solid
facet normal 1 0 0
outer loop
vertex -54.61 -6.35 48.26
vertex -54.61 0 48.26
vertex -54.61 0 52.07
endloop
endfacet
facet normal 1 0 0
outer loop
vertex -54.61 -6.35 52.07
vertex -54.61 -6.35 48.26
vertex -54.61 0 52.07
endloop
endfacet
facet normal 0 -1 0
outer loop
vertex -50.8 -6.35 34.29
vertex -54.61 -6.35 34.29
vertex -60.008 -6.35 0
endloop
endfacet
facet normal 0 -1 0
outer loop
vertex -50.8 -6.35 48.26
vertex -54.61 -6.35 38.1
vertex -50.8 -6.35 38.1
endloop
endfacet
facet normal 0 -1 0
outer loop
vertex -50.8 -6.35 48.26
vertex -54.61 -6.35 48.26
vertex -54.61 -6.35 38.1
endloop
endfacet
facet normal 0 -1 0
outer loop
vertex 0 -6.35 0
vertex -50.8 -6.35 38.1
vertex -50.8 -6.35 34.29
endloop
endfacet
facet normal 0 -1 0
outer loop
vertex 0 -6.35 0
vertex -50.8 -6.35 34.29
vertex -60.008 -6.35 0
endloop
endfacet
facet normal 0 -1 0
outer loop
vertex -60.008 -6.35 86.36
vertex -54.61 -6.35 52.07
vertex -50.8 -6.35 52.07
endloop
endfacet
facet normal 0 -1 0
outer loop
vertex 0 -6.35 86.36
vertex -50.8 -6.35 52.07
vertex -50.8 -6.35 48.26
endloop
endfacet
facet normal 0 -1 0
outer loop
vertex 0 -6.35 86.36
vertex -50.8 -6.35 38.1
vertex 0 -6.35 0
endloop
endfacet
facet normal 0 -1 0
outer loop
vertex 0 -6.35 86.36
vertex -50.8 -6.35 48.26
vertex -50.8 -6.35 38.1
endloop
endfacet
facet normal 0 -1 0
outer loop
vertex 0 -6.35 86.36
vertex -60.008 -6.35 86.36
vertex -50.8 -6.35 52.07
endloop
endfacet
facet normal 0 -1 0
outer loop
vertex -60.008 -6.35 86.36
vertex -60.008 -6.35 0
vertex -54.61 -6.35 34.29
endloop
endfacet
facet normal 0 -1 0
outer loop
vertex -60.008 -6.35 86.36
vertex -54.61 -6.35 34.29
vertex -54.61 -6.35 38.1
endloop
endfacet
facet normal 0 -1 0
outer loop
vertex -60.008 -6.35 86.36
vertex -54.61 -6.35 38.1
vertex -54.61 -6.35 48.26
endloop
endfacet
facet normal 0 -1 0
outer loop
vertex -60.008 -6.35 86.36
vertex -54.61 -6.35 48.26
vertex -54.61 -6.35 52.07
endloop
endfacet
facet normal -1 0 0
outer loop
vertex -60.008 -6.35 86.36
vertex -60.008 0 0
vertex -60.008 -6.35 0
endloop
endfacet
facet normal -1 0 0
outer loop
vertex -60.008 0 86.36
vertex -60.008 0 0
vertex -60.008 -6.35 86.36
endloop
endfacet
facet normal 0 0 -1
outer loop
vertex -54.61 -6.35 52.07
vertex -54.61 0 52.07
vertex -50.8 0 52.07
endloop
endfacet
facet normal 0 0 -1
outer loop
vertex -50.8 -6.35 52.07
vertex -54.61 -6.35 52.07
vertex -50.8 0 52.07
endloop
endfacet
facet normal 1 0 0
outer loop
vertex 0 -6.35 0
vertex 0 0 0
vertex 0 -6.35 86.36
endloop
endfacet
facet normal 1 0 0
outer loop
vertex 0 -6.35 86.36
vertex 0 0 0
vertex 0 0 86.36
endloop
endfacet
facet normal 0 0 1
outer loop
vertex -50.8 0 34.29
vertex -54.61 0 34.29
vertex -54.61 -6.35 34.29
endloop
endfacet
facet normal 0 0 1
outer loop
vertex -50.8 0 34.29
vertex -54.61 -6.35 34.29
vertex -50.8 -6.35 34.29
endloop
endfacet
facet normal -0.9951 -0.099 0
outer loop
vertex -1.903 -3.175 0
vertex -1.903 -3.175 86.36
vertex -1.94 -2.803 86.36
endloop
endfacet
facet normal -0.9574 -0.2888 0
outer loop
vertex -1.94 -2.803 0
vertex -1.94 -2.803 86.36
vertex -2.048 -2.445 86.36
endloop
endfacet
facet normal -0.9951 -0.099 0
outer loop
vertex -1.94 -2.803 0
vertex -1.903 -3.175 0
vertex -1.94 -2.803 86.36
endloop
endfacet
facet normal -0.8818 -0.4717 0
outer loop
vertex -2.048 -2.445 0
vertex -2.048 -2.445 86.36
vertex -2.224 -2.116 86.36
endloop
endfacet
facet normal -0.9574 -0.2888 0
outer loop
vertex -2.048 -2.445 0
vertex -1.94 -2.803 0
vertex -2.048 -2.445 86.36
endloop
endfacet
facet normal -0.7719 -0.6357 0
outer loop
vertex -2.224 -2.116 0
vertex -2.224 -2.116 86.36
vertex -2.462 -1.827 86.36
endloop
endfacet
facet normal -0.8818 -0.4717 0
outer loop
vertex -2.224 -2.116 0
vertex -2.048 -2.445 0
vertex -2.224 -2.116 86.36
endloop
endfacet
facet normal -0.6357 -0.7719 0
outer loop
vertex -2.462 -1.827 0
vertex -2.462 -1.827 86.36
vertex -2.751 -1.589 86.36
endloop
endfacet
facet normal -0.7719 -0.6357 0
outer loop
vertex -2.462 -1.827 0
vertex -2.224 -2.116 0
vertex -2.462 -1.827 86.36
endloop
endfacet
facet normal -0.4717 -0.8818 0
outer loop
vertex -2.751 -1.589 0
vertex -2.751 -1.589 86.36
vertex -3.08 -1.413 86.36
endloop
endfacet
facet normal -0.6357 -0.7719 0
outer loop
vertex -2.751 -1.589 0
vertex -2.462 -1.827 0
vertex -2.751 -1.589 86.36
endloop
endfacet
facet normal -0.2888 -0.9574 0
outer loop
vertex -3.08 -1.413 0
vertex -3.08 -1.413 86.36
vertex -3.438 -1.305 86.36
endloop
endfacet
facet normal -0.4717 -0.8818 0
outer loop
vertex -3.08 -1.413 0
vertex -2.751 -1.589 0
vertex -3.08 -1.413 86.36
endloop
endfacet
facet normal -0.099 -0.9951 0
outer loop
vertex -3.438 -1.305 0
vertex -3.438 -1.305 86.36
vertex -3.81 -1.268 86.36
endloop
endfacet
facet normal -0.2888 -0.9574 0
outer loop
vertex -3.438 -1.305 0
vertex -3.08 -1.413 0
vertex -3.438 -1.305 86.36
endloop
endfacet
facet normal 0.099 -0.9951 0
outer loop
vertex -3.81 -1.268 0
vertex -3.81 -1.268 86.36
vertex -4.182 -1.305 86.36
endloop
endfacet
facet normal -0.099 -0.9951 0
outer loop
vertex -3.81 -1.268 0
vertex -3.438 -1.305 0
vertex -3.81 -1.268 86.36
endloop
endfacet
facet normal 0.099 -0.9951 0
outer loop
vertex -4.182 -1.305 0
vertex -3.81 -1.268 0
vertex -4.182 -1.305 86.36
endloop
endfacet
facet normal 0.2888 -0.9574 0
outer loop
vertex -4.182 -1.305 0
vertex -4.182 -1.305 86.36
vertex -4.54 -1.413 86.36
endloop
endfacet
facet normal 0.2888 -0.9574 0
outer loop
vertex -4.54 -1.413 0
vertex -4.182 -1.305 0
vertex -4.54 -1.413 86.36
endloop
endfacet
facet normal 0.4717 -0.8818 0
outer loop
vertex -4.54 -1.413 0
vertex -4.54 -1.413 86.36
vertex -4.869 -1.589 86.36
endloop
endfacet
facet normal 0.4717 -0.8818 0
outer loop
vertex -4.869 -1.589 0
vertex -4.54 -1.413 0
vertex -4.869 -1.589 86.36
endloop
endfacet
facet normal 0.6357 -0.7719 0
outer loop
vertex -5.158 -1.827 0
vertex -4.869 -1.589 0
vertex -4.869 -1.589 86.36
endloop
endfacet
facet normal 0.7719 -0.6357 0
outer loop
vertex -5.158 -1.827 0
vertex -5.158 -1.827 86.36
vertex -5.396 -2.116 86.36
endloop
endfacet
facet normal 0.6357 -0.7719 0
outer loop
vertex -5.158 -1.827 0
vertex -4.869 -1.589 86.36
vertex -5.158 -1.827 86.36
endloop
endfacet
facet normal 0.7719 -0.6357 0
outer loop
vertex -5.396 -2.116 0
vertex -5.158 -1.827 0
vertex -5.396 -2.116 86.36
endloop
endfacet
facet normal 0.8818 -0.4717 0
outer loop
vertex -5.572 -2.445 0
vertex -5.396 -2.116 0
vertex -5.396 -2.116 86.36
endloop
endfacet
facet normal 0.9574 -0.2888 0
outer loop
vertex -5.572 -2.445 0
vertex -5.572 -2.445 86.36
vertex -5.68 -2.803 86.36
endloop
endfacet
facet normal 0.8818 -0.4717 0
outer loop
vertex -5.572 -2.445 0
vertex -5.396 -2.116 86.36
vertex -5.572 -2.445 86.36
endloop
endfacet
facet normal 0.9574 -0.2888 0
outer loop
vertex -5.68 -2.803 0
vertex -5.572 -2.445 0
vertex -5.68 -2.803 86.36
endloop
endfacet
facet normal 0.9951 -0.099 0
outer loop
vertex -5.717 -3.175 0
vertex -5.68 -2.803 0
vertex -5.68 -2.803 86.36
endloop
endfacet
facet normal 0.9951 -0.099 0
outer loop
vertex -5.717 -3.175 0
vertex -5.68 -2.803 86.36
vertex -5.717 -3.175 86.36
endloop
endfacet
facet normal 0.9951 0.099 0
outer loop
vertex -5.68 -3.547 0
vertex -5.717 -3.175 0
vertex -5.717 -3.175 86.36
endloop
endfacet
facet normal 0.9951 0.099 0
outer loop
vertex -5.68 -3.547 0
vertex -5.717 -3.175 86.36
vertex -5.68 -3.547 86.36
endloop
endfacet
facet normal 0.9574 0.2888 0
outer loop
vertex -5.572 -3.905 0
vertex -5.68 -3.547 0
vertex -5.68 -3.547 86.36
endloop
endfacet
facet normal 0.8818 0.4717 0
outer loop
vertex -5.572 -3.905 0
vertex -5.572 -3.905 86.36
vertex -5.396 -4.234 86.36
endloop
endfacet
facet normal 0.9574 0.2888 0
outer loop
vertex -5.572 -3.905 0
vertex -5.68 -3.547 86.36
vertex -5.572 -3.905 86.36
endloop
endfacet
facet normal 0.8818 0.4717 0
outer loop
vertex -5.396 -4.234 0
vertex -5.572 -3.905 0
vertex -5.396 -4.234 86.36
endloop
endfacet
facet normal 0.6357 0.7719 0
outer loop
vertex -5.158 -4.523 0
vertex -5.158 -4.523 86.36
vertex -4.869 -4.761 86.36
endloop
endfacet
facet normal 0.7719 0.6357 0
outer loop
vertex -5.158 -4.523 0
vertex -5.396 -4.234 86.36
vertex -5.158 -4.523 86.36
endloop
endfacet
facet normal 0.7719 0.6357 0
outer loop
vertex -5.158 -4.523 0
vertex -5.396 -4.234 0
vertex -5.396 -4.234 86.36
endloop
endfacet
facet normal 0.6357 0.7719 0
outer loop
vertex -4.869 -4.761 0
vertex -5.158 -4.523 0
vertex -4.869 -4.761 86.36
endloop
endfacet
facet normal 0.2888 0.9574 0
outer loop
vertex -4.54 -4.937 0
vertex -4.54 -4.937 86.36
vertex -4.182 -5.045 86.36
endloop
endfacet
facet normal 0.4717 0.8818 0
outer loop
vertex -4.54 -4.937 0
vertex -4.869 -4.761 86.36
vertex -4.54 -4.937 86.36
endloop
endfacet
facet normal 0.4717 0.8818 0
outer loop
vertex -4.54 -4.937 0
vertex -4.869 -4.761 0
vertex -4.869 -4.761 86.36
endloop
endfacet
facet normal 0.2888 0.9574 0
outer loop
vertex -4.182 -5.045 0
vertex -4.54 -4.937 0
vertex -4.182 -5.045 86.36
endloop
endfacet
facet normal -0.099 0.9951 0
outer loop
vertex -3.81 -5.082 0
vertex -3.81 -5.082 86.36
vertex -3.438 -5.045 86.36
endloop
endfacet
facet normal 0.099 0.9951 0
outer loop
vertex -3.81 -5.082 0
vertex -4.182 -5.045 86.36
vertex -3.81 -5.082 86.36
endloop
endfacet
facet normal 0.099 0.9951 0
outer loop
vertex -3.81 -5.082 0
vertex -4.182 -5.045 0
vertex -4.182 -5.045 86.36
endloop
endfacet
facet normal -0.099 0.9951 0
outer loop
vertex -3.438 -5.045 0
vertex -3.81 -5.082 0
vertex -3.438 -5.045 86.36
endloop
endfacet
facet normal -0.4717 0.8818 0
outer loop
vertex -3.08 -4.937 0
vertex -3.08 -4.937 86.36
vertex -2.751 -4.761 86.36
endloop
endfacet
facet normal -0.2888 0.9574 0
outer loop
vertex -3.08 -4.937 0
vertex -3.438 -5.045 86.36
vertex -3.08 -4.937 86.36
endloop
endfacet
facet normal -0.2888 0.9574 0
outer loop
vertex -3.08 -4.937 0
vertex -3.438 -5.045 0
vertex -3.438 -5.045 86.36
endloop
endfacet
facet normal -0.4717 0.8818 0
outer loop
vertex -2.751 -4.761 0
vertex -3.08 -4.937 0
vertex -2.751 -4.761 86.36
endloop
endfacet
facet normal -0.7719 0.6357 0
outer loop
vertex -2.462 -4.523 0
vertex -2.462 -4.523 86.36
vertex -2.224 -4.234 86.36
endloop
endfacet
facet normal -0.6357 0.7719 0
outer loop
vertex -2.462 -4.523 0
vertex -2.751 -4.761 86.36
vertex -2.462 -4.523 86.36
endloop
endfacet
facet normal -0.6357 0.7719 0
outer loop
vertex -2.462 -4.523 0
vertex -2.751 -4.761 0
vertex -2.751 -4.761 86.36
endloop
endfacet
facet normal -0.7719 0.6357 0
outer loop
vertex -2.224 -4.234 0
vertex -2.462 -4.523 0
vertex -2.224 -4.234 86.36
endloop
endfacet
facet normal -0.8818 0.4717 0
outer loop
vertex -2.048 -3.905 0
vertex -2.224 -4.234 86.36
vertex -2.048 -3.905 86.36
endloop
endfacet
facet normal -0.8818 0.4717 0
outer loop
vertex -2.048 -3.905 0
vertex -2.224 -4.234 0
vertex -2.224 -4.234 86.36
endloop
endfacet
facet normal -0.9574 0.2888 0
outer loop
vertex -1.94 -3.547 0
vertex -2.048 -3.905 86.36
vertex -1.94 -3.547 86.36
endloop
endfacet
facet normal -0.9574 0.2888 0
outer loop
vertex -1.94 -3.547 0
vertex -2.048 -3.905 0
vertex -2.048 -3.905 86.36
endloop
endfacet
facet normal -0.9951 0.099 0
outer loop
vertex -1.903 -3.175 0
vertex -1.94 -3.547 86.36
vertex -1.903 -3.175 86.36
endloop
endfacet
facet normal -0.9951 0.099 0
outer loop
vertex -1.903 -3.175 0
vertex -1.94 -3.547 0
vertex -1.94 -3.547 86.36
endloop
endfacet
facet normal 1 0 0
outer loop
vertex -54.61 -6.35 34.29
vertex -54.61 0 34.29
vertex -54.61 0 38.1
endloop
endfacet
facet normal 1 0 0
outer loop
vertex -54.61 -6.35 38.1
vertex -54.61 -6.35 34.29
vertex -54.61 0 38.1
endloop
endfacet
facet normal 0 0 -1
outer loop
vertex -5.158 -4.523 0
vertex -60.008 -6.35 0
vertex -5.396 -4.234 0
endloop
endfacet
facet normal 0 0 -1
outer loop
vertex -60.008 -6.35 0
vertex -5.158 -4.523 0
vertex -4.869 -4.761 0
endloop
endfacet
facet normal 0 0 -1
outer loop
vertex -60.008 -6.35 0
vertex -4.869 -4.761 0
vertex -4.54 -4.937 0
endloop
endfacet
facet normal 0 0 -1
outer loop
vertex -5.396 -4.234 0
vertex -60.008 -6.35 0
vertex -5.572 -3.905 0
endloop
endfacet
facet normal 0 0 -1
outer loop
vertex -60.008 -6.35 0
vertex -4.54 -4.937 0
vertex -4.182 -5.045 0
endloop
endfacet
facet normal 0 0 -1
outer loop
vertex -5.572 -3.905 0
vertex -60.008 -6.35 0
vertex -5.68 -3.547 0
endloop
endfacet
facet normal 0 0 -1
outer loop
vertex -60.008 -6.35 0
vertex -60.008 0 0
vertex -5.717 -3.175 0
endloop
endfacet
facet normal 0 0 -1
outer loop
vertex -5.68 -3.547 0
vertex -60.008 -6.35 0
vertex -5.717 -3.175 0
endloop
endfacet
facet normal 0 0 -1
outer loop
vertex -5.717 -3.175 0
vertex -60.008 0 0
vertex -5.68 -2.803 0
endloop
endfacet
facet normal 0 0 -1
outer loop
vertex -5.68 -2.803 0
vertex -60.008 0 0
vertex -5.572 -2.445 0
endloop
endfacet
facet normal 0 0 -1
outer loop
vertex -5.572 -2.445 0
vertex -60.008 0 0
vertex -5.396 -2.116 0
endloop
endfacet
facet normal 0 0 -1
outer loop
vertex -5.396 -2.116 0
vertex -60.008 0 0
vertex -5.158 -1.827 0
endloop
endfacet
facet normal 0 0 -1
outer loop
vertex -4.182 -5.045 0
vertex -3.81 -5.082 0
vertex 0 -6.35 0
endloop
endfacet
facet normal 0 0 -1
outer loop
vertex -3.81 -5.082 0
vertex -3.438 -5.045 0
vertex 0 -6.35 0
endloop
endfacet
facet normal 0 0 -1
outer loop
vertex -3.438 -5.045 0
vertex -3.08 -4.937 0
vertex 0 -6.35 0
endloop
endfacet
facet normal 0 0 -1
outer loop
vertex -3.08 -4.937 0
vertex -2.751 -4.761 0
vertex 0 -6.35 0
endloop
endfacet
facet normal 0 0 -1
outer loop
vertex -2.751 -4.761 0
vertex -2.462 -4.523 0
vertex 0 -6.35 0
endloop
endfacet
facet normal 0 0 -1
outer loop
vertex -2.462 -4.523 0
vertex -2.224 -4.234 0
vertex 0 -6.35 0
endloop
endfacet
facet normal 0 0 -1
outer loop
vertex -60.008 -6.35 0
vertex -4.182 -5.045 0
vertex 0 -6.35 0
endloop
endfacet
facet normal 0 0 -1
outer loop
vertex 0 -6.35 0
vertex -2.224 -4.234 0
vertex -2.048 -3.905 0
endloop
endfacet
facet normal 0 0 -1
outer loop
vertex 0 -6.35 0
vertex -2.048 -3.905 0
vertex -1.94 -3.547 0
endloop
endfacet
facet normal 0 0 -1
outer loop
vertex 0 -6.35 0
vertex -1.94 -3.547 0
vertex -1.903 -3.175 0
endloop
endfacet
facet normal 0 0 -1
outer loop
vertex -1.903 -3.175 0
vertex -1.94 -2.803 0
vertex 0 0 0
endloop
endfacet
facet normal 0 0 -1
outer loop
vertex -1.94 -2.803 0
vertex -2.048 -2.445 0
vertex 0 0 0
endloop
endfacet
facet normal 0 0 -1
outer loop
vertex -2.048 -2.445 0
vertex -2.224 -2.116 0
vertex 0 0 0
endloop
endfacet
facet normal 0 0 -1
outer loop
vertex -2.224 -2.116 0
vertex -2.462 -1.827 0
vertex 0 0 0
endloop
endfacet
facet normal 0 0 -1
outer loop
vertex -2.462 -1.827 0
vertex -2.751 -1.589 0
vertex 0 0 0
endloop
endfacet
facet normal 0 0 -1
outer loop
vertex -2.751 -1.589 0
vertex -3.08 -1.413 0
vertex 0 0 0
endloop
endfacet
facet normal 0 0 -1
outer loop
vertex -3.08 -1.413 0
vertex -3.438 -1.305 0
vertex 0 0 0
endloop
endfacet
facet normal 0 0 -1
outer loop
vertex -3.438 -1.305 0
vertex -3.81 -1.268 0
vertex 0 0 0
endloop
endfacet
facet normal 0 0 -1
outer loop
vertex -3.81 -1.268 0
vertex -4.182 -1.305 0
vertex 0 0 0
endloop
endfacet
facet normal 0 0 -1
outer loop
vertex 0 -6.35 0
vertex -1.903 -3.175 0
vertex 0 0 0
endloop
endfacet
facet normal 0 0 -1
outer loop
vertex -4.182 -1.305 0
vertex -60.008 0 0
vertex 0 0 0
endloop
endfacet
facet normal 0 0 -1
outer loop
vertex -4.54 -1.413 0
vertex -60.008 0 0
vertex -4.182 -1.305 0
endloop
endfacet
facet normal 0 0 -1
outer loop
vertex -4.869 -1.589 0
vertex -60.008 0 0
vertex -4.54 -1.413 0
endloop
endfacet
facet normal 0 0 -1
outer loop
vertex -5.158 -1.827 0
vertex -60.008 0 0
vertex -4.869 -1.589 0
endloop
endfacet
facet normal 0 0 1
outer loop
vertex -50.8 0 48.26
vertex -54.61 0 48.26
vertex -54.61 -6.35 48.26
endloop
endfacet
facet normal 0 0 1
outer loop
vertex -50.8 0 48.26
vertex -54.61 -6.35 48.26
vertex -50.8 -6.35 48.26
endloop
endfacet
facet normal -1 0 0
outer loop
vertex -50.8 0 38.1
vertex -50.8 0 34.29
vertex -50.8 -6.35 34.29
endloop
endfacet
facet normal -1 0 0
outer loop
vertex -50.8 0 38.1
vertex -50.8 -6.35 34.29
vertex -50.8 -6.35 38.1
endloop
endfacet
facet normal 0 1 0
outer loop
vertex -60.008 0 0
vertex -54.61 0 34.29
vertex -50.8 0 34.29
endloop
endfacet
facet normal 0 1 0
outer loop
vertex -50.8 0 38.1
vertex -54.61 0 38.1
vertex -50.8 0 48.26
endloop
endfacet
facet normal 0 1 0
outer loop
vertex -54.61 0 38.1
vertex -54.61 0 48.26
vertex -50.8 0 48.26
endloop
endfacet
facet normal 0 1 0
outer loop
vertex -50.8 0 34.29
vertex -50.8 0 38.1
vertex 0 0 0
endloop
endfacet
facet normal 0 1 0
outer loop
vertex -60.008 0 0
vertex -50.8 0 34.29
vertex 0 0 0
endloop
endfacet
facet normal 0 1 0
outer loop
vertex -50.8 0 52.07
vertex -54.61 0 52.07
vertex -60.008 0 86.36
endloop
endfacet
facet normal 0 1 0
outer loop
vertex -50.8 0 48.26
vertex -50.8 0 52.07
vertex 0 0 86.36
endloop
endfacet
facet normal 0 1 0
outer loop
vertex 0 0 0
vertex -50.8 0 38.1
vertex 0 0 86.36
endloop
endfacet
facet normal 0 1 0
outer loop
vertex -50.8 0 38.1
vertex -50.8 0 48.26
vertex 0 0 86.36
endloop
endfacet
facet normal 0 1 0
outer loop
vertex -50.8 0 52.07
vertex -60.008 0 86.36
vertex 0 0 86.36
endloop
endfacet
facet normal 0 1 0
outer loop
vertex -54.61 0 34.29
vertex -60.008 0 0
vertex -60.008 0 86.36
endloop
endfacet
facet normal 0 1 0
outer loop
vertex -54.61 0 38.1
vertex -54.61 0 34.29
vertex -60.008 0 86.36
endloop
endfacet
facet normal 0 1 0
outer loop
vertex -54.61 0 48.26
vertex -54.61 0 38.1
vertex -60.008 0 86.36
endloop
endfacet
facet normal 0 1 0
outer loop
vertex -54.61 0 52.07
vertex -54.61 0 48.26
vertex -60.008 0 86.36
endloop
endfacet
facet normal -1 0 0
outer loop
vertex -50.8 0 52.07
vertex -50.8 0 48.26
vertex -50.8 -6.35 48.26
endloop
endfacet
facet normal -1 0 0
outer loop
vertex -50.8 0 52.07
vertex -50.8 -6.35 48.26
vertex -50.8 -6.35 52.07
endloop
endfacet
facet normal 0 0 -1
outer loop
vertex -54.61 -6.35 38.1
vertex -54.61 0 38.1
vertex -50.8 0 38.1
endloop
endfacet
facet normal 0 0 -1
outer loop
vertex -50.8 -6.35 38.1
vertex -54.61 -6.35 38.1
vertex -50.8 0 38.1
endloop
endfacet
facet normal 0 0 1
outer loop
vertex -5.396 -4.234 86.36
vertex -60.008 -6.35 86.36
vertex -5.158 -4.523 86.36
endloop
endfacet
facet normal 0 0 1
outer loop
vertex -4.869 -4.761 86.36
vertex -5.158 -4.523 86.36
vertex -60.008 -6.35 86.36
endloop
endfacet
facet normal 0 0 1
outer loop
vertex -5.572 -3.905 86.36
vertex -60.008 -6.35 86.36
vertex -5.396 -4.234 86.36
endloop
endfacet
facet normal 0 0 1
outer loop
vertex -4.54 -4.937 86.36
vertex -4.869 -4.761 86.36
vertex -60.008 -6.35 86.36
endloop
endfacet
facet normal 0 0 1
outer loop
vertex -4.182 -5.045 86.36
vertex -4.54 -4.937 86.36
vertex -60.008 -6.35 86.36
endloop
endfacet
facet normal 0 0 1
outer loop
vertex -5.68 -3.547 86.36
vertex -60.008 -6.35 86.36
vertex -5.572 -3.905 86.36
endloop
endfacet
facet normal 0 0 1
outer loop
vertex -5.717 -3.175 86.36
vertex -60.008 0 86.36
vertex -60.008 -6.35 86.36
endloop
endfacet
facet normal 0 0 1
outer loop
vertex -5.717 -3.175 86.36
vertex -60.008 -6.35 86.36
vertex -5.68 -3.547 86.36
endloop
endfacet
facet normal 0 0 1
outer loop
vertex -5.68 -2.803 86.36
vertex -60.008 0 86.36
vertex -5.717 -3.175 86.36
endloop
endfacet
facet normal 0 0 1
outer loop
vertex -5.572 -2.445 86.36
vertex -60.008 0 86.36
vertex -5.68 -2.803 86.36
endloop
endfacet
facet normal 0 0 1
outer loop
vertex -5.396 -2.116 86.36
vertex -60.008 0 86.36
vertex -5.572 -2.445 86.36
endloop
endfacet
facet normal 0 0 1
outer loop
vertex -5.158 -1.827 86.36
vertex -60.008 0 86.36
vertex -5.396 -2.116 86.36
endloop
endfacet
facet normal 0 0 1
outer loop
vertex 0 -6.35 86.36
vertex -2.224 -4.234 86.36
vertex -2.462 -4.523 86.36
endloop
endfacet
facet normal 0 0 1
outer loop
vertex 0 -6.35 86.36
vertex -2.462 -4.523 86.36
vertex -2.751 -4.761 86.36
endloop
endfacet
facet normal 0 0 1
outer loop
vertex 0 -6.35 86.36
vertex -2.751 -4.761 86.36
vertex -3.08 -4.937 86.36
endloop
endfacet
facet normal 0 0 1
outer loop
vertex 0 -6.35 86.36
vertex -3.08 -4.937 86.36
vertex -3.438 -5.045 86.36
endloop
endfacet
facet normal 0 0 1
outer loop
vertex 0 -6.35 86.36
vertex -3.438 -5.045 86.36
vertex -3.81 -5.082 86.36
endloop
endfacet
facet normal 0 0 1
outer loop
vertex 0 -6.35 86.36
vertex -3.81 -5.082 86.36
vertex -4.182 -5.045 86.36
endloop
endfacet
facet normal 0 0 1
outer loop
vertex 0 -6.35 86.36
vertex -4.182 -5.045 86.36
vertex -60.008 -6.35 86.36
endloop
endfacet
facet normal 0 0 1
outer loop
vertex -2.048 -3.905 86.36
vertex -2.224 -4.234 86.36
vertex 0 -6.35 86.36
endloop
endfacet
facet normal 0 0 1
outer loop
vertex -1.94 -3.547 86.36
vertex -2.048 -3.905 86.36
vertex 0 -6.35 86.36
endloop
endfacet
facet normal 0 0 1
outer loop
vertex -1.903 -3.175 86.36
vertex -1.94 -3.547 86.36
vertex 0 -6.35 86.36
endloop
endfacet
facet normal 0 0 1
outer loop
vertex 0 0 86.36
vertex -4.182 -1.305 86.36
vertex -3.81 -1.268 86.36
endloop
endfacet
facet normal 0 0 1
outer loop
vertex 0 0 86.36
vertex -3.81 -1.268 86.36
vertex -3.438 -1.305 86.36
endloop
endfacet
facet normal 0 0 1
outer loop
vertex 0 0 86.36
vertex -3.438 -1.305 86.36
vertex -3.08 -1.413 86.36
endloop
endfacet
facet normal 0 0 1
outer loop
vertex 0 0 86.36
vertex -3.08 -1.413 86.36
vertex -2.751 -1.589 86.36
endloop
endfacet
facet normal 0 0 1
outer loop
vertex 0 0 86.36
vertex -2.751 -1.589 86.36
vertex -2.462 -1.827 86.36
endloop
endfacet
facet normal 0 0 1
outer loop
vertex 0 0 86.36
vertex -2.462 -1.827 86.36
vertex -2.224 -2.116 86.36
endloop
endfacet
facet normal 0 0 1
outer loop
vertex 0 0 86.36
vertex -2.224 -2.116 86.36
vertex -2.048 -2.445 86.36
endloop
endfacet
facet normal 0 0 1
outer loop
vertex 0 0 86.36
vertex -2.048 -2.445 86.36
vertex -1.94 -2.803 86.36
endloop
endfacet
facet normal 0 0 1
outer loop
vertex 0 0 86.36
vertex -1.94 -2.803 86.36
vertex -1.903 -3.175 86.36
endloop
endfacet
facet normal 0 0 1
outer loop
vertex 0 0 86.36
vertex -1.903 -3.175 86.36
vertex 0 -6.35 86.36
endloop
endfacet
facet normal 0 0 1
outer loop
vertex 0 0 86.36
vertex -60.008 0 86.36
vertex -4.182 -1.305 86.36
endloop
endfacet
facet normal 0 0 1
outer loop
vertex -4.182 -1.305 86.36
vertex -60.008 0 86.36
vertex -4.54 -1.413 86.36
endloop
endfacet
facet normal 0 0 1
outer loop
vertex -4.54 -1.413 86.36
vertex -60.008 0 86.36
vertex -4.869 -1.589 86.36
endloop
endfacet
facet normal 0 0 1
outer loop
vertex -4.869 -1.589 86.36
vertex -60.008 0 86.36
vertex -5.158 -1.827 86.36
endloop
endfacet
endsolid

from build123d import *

# Parameters (mm, degrees)
F0_W     = 60.0075
F0_H     = 86.36
F0_W_2   = 3.81
F0_H_2   = 3.81
F1_DEPTH = 6.35
F2_R     = 1.906977
F3_DEPTH = 86.361


with BuildPart() as f1:
    # F0 (on Front) → F1 (new body)
    with BuildSketch(Plane.XZ):
        with Locations((-30.00375, 43.18)):
            Rectangle(F0_W, F0_H)
        with Locations((-52.705, 36.195)):
            Rectangle(F0_W_2, F0_H_2, mode=Mode.SUBTRACT)
        with Locations((-52.705, 50.165)):
            Rectangle(F0_W_2, F0_H_2, mode=Mode.SUBTRACT)
    extrude(amount=F1_DEPTH)

    # F2 (on Top) → F3 (cut, through all)
    with BuildSketch(Plane.XY):
        with Locations((-3.81, -3.175)):
            Circle(F2_R)
    extrude(amount=F3_DEPTH, mode=Mode.SUBTRACT)


solid = f1.part
